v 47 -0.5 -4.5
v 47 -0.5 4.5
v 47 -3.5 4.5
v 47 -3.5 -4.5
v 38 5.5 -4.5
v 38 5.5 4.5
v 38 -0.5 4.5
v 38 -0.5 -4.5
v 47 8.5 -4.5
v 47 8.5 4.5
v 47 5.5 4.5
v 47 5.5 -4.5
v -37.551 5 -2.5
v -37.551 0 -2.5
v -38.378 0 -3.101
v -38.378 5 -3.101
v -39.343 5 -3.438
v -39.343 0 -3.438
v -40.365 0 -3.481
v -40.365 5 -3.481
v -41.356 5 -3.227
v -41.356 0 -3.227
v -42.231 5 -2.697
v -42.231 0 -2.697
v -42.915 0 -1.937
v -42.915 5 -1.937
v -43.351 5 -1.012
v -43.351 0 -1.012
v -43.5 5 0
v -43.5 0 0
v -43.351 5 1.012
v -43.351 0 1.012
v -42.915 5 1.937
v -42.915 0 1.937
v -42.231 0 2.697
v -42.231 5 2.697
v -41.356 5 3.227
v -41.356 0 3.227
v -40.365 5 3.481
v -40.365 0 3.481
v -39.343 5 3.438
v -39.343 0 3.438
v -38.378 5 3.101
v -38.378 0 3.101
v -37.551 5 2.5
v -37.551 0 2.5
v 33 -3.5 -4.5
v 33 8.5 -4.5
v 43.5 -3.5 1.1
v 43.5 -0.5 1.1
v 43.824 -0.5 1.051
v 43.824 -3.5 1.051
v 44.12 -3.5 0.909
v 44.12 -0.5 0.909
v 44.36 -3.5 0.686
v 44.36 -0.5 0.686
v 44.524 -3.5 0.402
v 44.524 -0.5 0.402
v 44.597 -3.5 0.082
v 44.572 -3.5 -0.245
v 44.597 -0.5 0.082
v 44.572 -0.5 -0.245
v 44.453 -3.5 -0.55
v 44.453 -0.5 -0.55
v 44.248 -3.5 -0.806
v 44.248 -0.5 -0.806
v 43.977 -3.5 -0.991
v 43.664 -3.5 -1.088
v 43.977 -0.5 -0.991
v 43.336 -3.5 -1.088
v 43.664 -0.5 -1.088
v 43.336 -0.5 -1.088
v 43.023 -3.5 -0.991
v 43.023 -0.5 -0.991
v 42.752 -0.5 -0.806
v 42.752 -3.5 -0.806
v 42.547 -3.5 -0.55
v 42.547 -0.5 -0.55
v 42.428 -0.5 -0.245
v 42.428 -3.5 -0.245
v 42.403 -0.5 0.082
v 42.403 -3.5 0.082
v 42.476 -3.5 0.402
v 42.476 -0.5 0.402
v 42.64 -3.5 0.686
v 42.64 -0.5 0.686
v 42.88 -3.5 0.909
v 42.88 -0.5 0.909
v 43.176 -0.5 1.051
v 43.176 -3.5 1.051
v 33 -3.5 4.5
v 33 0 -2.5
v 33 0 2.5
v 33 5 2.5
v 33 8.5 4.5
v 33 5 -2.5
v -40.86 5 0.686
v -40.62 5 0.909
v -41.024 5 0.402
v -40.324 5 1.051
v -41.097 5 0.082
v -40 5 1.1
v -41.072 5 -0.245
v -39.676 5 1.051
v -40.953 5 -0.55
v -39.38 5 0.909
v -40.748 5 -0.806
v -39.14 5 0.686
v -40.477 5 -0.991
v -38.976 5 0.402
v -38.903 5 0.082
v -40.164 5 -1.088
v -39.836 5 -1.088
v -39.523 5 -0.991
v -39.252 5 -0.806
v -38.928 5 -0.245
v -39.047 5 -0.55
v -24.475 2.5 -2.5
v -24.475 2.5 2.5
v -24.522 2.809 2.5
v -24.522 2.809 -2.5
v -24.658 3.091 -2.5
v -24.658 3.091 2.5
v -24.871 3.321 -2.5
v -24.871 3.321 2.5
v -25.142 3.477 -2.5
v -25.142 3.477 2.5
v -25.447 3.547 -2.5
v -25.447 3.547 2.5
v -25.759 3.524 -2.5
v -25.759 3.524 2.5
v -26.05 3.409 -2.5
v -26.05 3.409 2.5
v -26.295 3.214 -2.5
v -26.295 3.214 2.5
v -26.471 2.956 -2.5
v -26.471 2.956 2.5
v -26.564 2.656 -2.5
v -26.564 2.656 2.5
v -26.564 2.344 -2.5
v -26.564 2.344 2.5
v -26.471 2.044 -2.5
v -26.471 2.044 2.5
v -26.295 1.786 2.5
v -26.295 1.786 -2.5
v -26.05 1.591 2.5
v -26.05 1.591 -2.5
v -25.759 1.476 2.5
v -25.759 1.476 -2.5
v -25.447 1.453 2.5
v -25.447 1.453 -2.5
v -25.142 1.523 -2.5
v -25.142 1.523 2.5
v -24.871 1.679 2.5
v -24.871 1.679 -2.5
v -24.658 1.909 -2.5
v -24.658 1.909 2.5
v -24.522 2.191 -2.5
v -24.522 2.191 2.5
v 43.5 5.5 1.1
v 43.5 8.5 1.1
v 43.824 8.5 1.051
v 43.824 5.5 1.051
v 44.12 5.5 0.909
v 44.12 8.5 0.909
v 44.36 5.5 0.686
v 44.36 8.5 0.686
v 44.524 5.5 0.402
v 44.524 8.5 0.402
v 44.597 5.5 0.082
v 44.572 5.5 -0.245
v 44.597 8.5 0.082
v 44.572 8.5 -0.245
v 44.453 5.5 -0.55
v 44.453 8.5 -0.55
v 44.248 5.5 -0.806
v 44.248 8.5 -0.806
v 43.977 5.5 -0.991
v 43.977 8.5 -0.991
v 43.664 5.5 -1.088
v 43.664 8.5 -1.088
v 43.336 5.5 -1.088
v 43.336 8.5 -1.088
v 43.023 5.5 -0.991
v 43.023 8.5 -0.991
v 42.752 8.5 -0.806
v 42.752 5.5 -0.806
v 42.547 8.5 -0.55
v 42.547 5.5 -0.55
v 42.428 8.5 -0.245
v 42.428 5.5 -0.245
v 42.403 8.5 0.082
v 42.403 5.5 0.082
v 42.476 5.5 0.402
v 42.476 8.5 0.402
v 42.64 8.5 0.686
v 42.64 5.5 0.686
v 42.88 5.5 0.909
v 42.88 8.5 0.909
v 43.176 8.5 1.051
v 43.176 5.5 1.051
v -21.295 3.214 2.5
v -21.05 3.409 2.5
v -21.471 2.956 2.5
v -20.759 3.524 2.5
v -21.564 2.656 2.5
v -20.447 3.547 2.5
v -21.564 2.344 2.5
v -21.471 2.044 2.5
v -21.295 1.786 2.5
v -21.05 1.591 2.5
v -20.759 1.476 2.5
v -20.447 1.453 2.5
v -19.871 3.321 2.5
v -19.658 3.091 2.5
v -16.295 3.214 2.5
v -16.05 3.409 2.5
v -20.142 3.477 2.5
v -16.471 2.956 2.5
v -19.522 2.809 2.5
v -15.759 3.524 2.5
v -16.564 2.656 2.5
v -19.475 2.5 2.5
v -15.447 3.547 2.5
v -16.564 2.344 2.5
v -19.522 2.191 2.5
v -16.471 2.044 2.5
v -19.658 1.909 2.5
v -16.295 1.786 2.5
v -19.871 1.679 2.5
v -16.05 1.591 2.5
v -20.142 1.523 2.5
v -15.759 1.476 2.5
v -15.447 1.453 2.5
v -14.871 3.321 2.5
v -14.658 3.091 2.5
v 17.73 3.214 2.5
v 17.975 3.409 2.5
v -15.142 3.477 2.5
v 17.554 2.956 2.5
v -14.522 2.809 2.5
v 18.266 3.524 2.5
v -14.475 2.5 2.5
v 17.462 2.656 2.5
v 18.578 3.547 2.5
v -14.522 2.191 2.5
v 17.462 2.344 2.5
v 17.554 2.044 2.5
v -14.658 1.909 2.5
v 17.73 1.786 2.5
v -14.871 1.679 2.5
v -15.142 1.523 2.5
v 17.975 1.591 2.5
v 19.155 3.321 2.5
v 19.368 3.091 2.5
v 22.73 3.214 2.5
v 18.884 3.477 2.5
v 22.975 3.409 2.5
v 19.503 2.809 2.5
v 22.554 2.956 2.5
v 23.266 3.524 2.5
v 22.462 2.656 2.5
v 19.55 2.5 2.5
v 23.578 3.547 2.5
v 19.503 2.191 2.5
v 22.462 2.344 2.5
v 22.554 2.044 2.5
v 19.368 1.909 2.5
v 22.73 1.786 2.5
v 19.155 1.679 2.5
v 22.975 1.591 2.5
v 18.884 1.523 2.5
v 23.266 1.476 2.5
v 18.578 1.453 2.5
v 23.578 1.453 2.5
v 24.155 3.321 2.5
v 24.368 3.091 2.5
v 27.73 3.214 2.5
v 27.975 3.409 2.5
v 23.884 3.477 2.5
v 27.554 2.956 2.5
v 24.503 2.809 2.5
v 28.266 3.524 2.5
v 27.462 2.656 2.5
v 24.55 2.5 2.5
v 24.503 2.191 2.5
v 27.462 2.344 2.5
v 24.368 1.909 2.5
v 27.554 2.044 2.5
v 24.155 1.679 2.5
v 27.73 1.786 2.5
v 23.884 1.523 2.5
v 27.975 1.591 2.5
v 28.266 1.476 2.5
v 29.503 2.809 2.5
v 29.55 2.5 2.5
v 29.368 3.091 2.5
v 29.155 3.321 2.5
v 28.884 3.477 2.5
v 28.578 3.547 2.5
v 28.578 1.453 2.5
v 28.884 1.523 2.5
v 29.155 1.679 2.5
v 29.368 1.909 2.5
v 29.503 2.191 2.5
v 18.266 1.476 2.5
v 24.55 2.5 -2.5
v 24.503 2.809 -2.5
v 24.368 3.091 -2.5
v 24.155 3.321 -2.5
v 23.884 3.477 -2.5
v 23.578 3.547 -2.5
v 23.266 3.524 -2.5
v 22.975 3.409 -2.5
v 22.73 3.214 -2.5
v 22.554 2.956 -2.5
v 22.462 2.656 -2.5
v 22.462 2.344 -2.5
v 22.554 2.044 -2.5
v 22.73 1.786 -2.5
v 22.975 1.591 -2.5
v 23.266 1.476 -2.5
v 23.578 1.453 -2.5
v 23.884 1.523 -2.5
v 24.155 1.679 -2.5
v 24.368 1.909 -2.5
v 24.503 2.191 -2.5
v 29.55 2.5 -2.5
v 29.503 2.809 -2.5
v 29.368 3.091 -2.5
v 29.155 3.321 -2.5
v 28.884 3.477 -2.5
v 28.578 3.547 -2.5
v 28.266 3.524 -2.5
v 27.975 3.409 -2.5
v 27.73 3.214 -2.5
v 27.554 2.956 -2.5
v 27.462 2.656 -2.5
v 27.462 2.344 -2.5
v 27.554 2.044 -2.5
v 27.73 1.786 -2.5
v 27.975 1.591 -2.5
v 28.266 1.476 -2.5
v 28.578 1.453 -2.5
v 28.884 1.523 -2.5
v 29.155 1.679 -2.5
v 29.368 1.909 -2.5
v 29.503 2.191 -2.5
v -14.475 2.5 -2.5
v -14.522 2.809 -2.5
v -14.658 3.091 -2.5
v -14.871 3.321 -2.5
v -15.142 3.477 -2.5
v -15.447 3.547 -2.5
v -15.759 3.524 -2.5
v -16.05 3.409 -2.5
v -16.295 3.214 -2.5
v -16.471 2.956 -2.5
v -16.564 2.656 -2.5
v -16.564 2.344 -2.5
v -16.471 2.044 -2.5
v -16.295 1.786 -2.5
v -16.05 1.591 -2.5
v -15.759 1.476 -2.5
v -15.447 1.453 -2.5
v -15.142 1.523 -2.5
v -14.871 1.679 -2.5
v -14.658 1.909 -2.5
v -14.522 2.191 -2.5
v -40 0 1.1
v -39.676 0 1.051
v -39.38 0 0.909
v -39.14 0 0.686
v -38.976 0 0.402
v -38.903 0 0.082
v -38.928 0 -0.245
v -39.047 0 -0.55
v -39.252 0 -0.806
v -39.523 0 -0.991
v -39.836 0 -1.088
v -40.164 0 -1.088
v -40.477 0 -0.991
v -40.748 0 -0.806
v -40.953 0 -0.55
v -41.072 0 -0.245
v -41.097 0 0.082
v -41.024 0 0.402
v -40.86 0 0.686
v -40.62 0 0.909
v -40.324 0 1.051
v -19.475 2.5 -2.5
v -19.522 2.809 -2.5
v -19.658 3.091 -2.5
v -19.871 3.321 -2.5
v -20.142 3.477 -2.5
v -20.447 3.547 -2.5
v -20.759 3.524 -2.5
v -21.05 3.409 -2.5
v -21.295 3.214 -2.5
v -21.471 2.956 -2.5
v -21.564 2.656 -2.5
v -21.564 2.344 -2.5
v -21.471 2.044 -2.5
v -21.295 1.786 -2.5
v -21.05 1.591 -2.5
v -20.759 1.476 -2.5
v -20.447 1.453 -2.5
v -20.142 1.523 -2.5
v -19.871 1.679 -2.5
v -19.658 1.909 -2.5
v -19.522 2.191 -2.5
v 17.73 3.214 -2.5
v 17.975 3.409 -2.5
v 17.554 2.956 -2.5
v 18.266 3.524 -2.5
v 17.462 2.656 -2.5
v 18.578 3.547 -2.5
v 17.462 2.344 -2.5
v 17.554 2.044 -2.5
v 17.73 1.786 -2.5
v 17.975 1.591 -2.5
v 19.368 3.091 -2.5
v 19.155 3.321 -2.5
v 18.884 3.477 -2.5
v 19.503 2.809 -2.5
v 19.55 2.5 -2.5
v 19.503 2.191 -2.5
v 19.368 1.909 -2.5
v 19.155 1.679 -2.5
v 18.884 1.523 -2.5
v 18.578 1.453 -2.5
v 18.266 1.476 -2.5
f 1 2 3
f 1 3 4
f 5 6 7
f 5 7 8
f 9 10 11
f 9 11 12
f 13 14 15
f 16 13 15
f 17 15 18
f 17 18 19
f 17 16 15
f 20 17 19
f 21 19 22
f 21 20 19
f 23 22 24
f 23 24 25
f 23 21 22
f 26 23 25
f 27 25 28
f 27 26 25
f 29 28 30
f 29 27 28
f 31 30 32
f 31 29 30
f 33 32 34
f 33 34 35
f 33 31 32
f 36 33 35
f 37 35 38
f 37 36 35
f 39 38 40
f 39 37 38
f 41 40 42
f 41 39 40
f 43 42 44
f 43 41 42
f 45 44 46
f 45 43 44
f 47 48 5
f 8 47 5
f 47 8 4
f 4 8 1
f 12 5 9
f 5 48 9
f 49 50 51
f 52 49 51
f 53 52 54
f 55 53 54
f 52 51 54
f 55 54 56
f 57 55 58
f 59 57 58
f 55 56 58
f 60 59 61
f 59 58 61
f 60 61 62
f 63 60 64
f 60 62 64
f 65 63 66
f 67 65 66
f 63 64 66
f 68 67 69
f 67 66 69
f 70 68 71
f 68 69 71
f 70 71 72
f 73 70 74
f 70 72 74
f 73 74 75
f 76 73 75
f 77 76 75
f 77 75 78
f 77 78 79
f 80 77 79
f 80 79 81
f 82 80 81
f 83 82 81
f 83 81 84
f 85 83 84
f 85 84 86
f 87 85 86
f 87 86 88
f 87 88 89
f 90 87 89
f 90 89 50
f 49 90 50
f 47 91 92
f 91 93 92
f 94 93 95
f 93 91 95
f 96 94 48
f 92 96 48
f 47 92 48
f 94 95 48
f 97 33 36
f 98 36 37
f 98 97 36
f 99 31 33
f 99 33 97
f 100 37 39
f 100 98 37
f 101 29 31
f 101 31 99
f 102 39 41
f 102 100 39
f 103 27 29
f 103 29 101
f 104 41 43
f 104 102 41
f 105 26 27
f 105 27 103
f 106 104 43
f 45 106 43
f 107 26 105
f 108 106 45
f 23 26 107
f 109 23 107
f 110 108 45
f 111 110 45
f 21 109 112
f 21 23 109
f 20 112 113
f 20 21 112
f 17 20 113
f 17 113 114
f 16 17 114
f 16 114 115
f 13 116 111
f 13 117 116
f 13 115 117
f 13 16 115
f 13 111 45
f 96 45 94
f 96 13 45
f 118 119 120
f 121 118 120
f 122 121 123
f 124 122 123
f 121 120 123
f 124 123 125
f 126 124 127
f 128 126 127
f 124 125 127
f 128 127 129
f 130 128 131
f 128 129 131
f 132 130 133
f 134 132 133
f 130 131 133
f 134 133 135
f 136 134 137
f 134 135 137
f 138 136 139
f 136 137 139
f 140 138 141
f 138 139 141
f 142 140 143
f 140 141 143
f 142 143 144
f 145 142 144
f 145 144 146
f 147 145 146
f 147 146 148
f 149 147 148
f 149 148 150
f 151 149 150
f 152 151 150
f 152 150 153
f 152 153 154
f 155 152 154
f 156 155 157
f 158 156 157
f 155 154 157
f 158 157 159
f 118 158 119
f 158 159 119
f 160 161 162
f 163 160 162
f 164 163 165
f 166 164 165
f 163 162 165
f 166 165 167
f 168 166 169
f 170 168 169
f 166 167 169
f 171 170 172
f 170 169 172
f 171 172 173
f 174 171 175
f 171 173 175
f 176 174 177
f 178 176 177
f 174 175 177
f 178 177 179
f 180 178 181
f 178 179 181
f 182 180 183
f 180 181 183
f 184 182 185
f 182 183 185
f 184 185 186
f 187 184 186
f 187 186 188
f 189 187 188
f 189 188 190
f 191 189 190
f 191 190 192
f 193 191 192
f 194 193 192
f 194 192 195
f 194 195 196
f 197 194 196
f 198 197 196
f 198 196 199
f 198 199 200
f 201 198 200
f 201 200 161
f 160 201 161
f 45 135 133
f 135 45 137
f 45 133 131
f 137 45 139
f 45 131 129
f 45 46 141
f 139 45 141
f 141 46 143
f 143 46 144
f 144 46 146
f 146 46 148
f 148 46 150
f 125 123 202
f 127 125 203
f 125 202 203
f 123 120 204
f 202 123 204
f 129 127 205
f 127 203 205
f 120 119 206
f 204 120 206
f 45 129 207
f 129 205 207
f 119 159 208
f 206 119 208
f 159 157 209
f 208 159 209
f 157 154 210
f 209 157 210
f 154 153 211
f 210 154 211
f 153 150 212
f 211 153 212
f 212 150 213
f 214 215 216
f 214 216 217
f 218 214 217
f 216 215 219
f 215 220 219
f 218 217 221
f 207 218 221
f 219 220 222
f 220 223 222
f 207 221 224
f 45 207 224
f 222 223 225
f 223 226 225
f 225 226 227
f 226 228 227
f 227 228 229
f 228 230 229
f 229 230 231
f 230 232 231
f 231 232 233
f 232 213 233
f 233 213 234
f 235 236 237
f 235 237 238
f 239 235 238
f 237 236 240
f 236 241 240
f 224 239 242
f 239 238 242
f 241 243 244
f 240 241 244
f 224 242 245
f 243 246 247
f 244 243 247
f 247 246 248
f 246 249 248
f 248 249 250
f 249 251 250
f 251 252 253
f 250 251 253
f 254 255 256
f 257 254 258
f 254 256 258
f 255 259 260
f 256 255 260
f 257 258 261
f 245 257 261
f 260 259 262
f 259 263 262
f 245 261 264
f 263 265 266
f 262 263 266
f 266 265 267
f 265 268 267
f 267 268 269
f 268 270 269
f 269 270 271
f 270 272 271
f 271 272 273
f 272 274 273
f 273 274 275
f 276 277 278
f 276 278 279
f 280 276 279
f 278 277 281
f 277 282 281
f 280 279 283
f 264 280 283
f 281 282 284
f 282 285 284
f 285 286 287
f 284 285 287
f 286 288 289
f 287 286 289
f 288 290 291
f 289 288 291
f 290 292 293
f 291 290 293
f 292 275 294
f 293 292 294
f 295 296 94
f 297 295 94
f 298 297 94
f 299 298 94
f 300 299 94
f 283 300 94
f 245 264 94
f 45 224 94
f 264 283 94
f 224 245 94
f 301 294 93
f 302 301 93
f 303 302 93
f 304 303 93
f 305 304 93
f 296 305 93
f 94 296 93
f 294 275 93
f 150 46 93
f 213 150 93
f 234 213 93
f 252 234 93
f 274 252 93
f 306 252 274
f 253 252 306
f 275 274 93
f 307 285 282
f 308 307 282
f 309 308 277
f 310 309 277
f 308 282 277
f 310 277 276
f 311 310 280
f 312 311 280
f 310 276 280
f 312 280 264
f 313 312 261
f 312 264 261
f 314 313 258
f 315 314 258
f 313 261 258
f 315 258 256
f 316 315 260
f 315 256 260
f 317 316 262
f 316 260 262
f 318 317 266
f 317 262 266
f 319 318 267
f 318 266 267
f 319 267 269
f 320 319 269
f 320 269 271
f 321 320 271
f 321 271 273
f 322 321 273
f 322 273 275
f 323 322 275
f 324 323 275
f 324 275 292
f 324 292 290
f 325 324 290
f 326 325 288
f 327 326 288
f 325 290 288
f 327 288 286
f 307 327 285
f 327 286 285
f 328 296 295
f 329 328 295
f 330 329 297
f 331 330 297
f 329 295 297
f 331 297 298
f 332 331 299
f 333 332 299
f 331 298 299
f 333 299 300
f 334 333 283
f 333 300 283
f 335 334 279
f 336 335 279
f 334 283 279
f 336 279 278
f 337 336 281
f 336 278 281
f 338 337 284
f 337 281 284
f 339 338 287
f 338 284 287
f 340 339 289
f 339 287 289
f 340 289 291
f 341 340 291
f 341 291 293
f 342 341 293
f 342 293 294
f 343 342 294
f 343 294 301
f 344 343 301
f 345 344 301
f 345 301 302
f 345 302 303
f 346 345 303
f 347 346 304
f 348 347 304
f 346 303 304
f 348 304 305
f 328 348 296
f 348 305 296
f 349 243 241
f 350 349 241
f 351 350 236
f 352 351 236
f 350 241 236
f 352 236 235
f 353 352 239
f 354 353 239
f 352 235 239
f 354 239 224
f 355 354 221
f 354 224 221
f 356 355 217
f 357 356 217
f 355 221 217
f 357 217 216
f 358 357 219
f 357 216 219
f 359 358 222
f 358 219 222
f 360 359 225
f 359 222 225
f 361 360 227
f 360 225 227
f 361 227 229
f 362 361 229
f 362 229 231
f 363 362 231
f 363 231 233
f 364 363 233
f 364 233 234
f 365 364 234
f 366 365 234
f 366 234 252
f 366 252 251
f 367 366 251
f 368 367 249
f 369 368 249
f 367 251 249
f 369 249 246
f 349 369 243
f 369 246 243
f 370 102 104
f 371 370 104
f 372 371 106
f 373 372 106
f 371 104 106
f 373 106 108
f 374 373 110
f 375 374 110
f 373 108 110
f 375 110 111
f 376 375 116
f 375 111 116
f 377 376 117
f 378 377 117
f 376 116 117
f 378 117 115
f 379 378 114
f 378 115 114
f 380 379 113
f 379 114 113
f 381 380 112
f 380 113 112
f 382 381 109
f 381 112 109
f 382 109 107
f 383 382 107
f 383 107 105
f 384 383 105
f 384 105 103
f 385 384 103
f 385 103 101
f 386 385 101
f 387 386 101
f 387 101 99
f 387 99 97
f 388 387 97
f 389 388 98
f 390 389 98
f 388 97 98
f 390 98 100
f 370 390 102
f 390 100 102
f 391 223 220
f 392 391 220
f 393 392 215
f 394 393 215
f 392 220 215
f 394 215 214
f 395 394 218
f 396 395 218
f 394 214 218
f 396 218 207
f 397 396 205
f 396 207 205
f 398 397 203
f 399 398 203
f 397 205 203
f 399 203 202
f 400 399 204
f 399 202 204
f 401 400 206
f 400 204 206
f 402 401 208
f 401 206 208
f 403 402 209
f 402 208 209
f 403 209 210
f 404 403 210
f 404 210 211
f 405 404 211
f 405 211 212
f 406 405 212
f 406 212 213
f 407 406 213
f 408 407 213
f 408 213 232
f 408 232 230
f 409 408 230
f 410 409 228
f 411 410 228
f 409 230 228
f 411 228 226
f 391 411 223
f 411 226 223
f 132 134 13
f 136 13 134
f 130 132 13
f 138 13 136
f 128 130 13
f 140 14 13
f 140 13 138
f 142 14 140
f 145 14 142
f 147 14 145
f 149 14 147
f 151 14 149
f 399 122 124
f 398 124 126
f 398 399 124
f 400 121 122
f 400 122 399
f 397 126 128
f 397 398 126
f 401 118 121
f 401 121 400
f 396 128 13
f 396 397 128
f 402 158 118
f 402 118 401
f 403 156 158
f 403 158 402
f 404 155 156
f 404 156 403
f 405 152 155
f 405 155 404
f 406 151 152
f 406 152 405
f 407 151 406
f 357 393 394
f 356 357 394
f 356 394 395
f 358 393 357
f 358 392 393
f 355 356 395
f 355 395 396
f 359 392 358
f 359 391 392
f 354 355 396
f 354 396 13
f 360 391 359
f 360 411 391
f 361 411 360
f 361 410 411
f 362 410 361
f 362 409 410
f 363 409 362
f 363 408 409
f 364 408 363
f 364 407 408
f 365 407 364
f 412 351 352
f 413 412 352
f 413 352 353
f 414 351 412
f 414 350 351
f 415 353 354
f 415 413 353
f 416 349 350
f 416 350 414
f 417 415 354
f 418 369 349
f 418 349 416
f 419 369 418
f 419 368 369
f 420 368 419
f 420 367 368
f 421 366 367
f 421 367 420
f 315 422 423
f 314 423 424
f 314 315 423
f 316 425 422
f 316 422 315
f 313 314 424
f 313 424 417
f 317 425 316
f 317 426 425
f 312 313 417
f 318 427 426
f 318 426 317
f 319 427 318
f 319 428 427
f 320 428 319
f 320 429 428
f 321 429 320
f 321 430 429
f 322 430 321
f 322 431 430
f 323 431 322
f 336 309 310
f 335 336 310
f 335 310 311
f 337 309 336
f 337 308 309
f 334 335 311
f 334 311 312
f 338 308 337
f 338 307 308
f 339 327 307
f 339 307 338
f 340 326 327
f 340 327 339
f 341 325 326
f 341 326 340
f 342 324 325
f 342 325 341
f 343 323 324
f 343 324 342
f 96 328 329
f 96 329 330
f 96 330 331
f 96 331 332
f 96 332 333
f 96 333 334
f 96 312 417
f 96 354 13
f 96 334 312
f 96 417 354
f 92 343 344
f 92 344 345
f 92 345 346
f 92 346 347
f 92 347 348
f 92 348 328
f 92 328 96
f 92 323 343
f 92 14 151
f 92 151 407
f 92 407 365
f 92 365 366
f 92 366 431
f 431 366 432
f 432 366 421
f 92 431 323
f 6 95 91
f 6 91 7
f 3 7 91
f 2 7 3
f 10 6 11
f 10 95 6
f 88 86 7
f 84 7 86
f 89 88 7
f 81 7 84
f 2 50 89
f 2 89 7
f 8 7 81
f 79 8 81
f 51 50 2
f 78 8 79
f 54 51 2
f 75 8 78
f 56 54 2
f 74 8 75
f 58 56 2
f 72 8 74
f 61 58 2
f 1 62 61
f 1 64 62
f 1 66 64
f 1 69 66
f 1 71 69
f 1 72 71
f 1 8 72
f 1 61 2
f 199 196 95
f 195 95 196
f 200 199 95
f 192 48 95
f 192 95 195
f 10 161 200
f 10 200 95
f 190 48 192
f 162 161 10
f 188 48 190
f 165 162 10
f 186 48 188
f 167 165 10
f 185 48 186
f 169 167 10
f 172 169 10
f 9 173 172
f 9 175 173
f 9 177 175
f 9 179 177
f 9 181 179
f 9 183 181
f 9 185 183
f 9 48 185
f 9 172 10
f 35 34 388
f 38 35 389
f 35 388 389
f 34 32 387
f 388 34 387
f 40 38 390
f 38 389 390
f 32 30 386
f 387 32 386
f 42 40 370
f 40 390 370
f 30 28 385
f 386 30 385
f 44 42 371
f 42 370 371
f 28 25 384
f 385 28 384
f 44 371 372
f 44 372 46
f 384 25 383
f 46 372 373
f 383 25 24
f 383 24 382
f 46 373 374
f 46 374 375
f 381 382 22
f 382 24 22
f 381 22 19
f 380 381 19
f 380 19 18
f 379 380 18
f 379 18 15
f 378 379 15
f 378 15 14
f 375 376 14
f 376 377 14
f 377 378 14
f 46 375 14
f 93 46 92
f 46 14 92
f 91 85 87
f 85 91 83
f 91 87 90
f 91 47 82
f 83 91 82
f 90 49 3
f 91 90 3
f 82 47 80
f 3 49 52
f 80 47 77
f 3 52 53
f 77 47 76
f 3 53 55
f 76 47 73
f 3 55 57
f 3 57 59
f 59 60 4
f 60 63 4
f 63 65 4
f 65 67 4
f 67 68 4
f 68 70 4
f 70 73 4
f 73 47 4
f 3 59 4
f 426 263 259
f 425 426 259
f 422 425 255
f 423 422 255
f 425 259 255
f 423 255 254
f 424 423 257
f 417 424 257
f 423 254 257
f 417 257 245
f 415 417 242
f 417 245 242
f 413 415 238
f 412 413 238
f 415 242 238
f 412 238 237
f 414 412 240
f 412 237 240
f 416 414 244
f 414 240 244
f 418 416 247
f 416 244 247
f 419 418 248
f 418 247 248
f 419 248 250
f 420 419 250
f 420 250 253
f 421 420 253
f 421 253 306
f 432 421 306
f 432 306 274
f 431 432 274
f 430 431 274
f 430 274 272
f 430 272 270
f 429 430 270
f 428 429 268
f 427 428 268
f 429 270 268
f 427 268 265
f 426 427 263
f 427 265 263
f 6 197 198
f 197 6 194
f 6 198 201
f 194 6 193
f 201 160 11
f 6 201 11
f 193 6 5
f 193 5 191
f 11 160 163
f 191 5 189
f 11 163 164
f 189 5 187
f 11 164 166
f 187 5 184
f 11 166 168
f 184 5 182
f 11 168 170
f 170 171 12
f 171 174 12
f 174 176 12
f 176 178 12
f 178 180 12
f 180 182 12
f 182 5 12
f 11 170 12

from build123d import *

# Parameters (mm, degrees)
SKETCH1_W           = 80
SKETCH1_H           = 5
BOSS_EXTRUDE1_DEPTH = 5
BOSS_EXTRUDE4_START = 3.5
SKETCH7_W           = 14
SKETCH7_H           = 9
BOSS_EXTRUDE4_DEPTH = 12
CUT_EXTRUDE5_START  = -3
SKETCH9_W           = 9
SKETCH9_H           = 9
CUT_EXTRUDE5_DEPTH  = 6
SKETCH11_R          = 1.1
CUT_EXTRUDE6_DEPTH  = 12
SKETCH16_R          = 3.5
BOSS_EXTRUDE7_DEPTH = 5
SKETCH15_R          = 1.1
CUT_EXTRUDE9_DEPTH  = 5
SKETCH18_R          = 1.05
CUT_EXTRUDE10_DEPTH = 5


with BuildPart() as part:
    # Sketch1 → Boss-Extrude1 (new body)
    with BuildSketch(Plane(origin=(0, 0, 0), x_dir=(1, 0, 0), z_dir=(0, 1, 0))):
        Rectangle(SKETCH1_W, SKETCH1_H)
    extrude(amount=BOSS_EXTRUDE1_DEPTH)

    # Sketch7 → Boss-Extrude4 (add)
    with BuildSketch(Plane(origin=(0, 5, 0), x_dir=(1, 0, 0), z_dir=(0, 1, 0)).offset(BOSS_EXTRUDE4_START)):
        with Locations((40, 0)):
            Rectangle(SKETCH7_W, SKETCH7_H)
    extrude(amount=-BOSS_EXTRUDE4_DEPTH)

    # Sketch9 → Cut-Extrude5 (cut)
    with BuildSketch(Plane(origin=(0, 8.5, 0), x_dir=(1, 0, 0), z_dir=(0, 1, 0)).offset(CUT_EXTRUDE5_START)):
        with Locations((42.5, 0)):
            Rectangle(SKETCH9_W, SKETCH9_H)
    extrude(amount=-CUT_EXTRUDE5_DEPTH, mode=Mode.SUBTRACT)

    # Sketch11 → Cut-Extrude6 (cut)
    with BuildSketch(Plane(origin=(0, 8.5, 0), x_dir=(1, 0, 0), z_dir=(0, 1, 0))):
        with Locations(Location((43.5, 0, 0), (0, 0, 270))):
            Circle(SKETCH11_R)
    extrude(amount=-CUT_EXTRUDE6_DEPTH, mode=Mode.SUBTRACT)

    # Sketch16 → Boss-Extrude7 (add)
    with BuildSketch(Plane(origin=(0, 5, 0), x_dir=(1, 0, 0), z_dir=(0, 1, 0))):
        with Locations((-40, 0)):
            Circle(SKETCH16_R)
    extrude(amount=-BOSS_EXTRUDE7_DEPTH)

    # Sketch15 → Cut-Extrude9 (cut)
    with BuildSketch(Plane(origin=(0, 5, 0), x_dir=(1, 0, 0), z_dir=(0, 1, 0))):
        with Locations(Location((-40, 0, 0), (0, 0, 270))):
            Circle(SKETCH15_R)
    extrude(amount=-CUT_EXTRUDE9_DEPTH, mode=Mode.SUBTRACT)

    # Sketch18 → Cut-Extrude10 (cut)
    with BuildSketch(Plane.XY.offset(2.5)):
        with Locations((-20.525255129, 2.5)):
            Circle(SKETCH18_R)
        with Locations((23.5, 2.5)):
            Circle(SKETCH18_R)
        with Locations((-25.525255129, 2.5)):
            Circle(SKETCH18_R)
        with Locations((-15.525255129, 2.5)):
            Circle(SKETCH18_R)
        with Locations((18.5, 2.5)):
            Circle(SKETCH18_R)
        with Locations((28.5, 2.5)):
            Circle(SKETCH18_R)
    extrude(amount=-CUT_EXTRUDE10_DEPTH, mode=Mode.SUBTRACT)


solid = part.part
